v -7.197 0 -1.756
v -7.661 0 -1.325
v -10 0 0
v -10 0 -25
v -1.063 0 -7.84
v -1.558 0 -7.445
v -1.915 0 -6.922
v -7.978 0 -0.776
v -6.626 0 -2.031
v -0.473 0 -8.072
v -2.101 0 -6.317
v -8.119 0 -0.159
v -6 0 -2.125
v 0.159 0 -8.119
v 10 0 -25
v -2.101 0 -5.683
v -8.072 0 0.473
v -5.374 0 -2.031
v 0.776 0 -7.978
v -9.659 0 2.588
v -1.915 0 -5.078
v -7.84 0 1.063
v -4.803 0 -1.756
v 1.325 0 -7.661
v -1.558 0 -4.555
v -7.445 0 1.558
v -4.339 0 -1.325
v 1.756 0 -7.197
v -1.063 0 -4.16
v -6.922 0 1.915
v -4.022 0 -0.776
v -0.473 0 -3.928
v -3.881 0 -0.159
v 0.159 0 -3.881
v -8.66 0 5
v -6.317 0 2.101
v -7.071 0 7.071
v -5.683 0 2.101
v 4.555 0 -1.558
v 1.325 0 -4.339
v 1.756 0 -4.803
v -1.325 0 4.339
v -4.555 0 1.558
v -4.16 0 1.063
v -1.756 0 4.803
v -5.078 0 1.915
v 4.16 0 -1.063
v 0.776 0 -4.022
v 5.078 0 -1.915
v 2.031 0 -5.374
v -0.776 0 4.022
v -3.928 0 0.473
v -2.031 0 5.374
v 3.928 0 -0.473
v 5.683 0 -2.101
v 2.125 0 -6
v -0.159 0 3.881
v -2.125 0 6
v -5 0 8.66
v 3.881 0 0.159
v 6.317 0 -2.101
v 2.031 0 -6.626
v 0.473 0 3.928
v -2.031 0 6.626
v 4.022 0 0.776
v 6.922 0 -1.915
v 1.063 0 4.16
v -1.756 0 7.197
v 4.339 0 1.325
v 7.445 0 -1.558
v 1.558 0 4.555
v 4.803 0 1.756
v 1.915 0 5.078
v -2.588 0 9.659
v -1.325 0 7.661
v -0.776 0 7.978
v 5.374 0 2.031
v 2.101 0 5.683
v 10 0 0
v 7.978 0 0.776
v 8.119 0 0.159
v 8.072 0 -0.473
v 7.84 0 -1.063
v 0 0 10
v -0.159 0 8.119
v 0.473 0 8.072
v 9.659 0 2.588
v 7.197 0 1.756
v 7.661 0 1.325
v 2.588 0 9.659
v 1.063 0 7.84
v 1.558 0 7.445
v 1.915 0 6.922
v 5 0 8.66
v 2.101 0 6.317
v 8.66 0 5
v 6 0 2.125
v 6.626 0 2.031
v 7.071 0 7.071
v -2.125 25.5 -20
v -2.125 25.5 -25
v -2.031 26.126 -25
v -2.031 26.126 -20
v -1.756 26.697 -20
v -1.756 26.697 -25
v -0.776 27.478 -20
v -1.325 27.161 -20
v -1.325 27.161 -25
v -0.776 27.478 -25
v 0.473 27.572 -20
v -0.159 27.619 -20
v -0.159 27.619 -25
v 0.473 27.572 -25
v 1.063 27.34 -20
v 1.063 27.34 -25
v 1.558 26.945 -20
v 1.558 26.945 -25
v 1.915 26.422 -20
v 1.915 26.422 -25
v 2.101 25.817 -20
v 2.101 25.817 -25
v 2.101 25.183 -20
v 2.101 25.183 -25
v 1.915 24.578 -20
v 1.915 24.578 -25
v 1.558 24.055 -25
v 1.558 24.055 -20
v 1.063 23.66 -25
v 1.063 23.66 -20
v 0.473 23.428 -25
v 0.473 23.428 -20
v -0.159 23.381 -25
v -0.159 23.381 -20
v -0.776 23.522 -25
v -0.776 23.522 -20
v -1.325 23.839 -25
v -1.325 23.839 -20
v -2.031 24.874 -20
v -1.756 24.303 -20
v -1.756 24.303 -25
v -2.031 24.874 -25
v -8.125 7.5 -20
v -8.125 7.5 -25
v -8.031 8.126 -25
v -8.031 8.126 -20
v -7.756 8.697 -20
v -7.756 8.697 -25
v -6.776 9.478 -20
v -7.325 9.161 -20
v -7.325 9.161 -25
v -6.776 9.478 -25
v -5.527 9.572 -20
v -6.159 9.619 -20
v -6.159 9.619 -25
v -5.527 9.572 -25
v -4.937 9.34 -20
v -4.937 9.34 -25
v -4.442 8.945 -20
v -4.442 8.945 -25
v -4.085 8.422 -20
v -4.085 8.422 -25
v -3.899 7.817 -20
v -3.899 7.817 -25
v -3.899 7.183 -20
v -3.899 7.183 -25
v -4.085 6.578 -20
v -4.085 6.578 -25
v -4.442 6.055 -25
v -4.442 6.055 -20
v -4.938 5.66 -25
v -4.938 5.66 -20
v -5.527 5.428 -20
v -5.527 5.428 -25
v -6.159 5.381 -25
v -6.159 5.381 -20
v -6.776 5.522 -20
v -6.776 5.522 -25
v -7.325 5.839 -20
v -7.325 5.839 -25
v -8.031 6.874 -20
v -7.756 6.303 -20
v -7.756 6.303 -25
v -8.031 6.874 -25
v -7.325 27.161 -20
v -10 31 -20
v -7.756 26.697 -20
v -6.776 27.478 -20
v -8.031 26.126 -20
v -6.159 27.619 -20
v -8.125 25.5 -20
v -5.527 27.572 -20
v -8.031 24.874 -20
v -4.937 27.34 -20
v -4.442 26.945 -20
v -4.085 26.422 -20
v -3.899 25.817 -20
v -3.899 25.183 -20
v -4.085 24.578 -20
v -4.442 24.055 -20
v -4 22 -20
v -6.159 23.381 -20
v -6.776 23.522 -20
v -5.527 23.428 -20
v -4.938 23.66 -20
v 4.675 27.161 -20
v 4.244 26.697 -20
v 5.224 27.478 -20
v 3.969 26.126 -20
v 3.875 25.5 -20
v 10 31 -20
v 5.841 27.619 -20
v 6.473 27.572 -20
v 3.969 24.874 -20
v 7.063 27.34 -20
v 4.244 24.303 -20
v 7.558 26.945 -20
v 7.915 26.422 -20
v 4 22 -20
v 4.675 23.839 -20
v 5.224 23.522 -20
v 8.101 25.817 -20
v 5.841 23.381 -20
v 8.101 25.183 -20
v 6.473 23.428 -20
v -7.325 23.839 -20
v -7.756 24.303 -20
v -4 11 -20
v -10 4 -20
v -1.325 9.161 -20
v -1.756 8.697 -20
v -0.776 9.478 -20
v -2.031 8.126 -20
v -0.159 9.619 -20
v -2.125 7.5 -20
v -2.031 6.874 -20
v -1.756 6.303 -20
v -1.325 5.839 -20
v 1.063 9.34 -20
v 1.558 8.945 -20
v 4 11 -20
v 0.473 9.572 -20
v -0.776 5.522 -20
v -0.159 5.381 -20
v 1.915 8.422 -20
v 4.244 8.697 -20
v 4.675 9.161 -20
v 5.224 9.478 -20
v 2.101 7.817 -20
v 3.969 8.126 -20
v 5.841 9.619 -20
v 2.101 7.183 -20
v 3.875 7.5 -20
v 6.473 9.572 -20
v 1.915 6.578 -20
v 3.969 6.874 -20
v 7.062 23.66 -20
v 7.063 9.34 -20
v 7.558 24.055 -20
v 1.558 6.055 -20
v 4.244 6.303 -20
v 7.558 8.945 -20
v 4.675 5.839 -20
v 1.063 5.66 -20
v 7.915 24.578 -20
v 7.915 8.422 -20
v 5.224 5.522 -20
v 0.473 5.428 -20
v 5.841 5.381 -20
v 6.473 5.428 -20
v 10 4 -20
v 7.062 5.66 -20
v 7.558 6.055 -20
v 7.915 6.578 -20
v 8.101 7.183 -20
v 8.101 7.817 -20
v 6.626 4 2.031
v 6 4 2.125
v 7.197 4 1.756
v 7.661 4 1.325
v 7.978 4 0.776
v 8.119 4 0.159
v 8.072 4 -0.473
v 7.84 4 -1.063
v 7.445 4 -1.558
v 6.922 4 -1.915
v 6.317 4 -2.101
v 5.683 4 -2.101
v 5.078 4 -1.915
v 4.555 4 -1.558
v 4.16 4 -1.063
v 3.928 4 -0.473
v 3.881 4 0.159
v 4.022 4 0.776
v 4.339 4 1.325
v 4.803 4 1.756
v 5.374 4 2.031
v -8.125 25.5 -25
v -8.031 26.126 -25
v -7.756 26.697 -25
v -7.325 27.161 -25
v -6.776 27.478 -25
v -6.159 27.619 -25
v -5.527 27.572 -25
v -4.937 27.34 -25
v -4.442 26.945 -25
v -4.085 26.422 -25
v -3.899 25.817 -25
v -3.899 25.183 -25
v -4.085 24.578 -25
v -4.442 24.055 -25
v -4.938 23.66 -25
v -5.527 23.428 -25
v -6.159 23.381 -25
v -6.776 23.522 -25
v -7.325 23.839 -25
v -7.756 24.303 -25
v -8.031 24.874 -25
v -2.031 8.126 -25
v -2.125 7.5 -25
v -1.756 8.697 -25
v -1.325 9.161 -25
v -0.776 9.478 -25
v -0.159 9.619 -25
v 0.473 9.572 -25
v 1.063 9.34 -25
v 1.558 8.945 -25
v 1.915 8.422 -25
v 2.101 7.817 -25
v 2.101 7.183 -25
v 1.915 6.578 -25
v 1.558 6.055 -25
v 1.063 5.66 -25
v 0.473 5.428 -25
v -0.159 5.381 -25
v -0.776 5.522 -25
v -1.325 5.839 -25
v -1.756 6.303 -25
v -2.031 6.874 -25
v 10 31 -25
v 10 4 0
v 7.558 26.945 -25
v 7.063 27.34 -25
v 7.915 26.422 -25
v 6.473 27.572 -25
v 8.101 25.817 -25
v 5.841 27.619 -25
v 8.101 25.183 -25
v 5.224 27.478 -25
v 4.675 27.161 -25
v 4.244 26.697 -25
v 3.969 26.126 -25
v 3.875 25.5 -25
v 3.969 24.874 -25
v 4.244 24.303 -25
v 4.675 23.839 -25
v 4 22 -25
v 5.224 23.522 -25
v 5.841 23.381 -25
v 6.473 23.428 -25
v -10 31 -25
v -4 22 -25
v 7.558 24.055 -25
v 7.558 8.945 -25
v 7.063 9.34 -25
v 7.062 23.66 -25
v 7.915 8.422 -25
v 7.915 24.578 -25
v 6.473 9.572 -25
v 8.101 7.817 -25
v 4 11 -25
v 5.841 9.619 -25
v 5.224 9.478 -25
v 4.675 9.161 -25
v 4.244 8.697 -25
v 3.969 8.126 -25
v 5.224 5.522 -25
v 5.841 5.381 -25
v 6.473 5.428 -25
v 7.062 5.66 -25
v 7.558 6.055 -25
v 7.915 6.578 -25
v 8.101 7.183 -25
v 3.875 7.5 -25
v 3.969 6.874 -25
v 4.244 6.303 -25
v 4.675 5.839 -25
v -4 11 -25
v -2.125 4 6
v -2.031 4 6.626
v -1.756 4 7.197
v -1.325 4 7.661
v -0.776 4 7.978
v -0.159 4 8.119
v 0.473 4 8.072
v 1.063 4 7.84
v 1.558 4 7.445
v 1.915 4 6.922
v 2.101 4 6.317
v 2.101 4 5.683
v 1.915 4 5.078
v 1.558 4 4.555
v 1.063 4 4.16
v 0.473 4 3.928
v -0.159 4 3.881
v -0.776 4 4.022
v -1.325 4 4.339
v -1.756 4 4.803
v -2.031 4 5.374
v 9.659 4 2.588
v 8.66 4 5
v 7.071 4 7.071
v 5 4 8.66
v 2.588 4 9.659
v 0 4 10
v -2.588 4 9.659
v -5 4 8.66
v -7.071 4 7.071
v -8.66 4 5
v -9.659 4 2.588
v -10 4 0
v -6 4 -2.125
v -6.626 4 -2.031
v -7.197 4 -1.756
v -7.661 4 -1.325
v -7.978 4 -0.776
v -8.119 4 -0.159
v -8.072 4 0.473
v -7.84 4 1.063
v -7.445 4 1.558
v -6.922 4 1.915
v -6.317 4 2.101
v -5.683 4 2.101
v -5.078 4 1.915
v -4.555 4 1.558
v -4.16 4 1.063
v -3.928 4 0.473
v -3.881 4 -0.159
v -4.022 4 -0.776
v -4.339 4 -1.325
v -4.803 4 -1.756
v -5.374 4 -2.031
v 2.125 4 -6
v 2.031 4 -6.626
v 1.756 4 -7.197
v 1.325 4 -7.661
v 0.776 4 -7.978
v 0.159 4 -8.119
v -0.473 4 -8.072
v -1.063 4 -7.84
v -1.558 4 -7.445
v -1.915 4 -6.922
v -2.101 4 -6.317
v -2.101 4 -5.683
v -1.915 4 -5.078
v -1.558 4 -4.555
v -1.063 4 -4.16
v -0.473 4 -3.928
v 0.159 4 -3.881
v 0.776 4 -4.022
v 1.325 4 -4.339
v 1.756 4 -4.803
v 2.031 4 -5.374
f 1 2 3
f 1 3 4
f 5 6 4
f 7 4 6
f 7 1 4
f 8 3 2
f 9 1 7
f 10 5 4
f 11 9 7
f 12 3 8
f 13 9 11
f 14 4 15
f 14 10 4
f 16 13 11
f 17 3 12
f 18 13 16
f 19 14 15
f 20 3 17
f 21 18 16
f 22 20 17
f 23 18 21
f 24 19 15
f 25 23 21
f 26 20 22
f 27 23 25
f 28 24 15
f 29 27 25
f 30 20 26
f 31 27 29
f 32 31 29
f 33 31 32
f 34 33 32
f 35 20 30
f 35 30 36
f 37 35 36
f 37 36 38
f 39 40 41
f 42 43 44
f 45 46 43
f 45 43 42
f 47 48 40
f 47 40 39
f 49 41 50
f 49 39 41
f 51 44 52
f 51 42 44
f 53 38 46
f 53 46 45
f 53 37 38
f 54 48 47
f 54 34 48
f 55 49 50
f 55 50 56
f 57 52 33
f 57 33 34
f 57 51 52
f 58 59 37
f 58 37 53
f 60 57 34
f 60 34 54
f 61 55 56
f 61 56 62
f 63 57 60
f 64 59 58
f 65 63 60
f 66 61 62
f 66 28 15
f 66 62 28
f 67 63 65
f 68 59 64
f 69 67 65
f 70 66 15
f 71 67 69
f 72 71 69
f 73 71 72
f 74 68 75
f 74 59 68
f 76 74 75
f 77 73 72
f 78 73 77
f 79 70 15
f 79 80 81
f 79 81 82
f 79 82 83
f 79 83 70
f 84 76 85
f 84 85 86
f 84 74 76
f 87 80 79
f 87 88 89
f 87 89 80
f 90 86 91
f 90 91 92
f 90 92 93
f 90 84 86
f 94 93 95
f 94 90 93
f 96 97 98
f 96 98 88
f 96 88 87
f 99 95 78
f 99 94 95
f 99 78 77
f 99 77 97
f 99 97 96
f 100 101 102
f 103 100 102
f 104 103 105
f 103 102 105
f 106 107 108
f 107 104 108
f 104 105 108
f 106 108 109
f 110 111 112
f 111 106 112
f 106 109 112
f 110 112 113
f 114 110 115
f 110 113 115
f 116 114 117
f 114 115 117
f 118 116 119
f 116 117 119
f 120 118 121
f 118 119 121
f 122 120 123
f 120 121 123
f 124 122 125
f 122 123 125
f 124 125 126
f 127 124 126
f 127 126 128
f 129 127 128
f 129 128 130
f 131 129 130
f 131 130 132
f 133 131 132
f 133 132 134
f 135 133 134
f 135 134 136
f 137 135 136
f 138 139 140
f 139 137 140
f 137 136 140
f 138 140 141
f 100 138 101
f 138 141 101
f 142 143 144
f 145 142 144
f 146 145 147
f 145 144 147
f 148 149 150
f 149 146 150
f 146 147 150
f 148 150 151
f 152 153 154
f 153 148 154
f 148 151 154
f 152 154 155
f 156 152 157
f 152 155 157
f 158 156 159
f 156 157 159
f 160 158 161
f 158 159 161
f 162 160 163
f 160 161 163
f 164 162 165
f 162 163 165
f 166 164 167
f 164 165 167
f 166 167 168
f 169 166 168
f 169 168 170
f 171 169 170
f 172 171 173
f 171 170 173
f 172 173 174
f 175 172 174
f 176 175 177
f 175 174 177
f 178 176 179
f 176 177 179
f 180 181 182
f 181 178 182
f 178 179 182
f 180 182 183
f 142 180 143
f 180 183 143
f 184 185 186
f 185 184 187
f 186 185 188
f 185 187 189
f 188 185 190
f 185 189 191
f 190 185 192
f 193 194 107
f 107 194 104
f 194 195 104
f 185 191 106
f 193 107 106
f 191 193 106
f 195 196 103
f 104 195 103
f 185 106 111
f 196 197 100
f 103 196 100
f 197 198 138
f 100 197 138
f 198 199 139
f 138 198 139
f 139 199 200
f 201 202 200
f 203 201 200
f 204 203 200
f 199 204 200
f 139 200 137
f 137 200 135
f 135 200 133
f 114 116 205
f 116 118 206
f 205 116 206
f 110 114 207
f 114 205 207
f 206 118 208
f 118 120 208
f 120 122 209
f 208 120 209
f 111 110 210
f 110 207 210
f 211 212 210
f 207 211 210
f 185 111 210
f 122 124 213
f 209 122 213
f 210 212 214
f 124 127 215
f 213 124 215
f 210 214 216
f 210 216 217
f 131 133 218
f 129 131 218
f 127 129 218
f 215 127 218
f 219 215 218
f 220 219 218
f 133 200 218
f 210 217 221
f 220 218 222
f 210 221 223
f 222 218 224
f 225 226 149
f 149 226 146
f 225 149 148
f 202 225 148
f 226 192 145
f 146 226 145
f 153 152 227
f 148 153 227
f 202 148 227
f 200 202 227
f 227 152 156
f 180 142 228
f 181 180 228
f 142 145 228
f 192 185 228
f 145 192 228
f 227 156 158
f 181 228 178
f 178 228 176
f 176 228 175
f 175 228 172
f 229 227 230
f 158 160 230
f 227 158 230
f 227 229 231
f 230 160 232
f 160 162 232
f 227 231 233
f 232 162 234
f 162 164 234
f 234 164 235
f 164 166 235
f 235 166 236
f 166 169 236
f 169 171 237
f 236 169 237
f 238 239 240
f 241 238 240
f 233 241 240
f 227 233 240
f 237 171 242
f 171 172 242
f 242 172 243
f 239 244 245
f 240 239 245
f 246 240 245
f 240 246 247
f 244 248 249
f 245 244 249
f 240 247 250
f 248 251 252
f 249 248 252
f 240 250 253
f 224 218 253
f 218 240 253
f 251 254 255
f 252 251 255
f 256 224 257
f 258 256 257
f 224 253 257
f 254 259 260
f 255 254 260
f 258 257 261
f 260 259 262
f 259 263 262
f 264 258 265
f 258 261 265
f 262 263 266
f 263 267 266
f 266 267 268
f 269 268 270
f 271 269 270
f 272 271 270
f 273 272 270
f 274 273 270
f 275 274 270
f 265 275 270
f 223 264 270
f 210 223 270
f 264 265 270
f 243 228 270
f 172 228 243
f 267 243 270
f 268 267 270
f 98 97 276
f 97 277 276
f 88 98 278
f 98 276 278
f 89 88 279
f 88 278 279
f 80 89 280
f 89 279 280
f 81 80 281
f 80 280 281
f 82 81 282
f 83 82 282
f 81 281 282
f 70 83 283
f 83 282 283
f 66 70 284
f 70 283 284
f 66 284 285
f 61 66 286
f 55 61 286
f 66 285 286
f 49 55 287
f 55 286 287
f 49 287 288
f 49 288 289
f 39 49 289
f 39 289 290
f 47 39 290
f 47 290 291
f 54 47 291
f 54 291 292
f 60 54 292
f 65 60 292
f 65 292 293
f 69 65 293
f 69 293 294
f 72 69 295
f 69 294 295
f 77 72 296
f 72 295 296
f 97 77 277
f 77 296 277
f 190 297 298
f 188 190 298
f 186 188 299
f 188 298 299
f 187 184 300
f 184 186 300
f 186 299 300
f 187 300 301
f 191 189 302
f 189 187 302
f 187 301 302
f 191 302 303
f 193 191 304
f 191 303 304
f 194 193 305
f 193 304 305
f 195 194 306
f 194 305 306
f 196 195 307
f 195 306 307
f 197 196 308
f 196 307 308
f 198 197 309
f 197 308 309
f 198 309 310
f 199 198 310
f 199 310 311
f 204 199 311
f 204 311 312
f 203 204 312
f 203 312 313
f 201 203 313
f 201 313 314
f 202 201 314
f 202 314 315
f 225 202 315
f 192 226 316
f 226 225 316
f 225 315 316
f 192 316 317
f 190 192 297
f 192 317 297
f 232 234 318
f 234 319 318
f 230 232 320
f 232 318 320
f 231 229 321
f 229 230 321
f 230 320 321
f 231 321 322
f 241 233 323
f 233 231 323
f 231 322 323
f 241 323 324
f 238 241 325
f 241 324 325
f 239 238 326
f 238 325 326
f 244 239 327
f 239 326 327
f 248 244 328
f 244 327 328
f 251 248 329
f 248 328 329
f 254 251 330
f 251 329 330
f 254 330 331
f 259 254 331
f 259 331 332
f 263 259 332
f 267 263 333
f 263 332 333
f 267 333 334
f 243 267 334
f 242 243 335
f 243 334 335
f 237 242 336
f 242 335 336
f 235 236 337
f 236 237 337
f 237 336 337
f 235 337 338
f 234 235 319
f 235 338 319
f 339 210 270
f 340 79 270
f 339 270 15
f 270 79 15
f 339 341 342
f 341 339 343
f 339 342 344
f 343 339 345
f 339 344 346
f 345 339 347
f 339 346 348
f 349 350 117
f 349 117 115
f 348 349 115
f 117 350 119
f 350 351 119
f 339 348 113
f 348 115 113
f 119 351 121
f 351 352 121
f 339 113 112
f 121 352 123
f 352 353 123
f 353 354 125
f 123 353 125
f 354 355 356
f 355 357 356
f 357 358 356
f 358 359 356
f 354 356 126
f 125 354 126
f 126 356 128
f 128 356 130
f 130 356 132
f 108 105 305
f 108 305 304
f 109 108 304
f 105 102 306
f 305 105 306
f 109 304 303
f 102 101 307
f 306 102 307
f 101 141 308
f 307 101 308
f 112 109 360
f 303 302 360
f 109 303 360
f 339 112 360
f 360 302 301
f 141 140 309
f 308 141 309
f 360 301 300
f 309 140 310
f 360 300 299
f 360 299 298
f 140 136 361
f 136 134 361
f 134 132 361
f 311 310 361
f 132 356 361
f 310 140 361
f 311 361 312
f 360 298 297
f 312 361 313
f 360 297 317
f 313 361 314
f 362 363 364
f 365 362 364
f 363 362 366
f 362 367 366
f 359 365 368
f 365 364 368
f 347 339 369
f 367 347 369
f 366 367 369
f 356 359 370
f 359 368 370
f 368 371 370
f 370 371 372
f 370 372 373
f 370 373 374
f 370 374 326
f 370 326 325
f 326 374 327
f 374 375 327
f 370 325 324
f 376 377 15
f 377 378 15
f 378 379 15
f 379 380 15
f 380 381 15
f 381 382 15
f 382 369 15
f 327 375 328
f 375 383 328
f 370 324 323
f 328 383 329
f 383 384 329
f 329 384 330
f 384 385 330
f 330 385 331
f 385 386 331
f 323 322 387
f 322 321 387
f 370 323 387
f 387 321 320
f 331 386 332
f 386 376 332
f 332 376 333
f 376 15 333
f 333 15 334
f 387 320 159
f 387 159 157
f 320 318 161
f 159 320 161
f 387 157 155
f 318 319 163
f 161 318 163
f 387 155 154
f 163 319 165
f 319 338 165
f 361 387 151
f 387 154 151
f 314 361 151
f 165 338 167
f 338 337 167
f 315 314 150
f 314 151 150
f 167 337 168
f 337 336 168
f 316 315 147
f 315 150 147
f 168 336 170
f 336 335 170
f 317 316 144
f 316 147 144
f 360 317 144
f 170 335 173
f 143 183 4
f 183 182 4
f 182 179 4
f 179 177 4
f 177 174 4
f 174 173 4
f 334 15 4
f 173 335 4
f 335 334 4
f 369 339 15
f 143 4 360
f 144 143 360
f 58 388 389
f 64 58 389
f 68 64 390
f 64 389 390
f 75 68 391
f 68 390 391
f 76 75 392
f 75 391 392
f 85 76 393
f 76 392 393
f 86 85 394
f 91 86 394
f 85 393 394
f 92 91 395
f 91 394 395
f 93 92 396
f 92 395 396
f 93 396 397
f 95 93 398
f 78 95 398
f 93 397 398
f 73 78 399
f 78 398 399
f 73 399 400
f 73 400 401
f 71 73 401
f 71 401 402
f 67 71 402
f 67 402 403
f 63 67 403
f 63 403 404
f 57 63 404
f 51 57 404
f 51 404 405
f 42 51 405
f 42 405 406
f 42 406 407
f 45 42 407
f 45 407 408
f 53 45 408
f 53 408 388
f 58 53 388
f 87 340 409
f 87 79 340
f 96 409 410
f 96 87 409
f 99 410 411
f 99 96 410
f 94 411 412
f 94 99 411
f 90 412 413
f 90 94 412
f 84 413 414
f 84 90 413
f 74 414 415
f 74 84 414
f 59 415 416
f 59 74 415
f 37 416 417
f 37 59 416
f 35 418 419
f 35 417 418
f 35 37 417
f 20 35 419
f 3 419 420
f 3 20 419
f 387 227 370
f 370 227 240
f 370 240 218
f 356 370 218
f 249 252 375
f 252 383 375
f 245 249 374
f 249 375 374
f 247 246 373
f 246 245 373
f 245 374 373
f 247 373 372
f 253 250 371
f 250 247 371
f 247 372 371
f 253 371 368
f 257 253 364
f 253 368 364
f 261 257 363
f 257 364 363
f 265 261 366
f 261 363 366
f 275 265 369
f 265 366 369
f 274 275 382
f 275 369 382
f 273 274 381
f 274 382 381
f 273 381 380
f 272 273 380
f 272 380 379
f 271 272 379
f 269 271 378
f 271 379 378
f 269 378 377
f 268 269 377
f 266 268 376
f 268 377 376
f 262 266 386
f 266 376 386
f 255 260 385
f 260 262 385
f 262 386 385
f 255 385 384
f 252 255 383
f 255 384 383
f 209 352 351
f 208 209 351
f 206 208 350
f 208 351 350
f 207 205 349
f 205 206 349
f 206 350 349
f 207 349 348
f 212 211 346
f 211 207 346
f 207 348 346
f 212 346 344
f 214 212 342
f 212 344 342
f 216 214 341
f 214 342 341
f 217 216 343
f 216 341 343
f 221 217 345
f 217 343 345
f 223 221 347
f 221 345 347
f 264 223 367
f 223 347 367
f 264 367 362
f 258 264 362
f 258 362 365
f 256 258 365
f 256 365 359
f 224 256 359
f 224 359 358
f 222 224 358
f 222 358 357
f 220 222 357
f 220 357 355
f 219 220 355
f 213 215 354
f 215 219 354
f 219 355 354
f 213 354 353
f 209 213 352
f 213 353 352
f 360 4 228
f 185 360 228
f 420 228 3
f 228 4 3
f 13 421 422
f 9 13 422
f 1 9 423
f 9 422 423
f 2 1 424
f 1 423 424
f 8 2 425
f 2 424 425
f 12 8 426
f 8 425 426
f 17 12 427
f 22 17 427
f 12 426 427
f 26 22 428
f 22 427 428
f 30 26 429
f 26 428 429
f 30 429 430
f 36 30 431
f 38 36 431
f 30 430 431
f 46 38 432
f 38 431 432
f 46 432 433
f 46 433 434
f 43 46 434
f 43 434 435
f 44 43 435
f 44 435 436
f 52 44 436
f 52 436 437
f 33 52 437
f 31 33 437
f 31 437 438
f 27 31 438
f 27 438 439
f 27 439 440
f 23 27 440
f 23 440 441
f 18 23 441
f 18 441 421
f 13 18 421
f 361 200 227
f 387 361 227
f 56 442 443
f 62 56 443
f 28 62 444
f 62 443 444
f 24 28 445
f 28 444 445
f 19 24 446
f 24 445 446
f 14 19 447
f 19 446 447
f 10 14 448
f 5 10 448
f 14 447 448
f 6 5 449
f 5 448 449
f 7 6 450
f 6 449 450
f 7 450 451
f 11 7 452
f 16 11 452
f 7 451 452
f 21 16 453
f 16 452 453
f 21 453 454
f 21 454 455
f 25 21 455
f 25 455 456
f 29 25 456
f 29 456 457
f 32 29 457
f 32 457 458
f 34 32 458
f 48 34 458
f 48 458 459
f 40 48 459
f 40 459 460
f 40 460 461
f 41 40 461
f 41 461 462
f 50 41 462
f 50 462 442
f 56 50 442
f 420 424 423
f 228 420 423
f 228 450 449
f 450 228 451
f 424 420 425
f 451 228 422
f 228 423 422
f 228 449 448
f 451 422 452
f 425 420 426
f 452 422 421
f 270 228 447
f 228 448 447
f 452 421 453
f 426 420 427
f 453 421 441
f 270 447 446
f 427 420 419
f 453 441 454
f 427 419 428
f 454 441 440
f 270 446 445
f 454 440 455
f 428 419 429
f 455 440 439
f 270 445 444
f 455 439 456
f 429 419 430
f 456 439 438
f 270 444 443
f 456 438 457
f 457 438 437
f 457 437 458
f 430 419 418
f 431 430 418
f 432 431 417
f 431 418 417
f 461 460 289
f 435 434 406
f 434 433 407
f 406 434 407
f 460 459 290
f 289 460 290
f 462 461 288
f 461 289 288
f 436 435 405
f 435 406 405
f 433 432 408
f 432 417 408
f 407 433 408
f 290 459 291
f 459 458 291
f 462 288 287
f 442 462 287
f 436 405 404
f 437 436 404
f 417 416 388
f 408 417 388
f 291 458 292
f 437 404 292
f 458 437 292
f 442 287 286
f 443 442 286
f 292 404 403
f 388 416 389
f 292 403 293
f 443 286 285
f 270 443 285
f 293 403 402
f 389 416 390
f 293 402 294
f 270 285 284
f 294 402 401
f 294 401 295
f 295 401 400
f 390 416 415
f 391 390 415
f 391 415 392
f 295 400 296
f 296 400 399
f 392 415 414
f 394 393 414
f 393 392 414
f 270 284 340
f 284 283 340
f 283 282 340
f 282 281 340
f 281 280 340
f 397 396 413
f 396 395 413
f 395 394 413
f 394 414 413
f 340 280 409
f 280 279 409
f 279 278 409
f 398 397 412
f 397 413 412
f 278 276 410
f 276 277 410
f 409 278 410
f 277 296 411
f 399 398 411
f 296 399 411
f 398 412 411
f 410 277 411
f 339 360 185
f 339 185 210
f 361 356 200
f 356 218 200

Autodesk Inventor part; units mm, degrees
ref_plane "YZ Plane" through (0, 0, 0) normal (1, 0, 0) x (0, 1, 0)
ref_plane "XZ Plane" through (0, 0, 0) normal (0, 1, 0) x (-1, 0, 0)
ref_plane "XY Plane" through (0, 0, 0) normal (0, 0, 1) x (1, 0, 0)
sketch "Sketch1" plane through (0, 0, 0) normal (0, 1, 0) x (-1, 0, 0)
  circle A0 centre (0, 0) radius 10
  dimension "d0" = 20
extrude "Extrusion1" add sketch "Sketch1" along normal blind 4
sketch "Sketch2" plane through (0, 4, 0) normal (0, 1, 0) x (1, 0, 0)
  line L0 (0, 0) -> (0, 6)
  circle A0 centre (0, 6) radius 2.125
  dimension "d3" = 6
  dimension "d4" = 4.25
extrude "Extrusion2" cut sketch "Sketch2" against normal through all
pattern_circular "Circular Pattern1" count 4 over 360 about axis through (0, 0, 0) along (0, 1, 0) of "Extrusion2"
sketch "Sketch3" plane through (0, 0, 0) normal (0, -1, 0) x (1, 0, 0)
  circle A0 centre (0, 0) radius 10 projected
  arc A1 (-10, 0) -> (10, 0) centre (0, 0) ccw
  line L0 (10, 0) -> (10, -25)
  line L1 (10, -25) -> (-10, -25)
  line L2 (-10, -25) -> (-10, 0)
  dimension "d10" = 25
extrude "Extrusion3" add sketch "Sketch3" against normal blind 4 contours L0 L1 L2 A0
sketch "Sketch4" plane through (0, 4, 0) normal (0, 1, 0) x (1, 0, 0)
  line L0 (-10, 25) -> (-10, 0) projected
  line L1 (10, 25) -> (-10, 25)
  line L2 (-10, 25) -> (-10, 20)
  line L3 (-10, 20) -> (10, 20)
  line L4 (10, 20) -> (10, 25)
  point P0 (0, 0)
  dimension "d13" = 5
extrude "Extrusion4" add sketch "Sketch4" along normal blind 27
sketch "Sketch5" plane through (10, 0, -25) normal (0, 0, -1) x (-1, 0, 0)
  point P0 (10, 0)
sketch "Sketch6" plane through (10, 0, -25) normal (0, 0, -1) x (-1, 0, 0)
  line L0 (7.875, 4) -> (12.125, 4) projected
  line L1 (20, 31) -> (0, 31) projected
  line L2 (10, 17.5) -> (20, 17.5)
  line L3 (10, 17.5) -> (10, 23.5)
  line L4 (10, 23.5) -> (10, 25.5)
  circle A0 centre (10, 25.5) radius 2.125
  point P0 (10, 0)
  dimension "d16" = 6
  dimension "d26" = 2
  dimension "d27" = 4.25
extrude "Extrusion5" cut sketch "Sketch6" against normal through all
pattern_linear "Rectangular Pattern1" count 3 spacing 6 along (-1, 0, 0) count 2 spacing 18 along (0, -1, 0) of "Extrusion5" first direction both ways yes
sketch "Sketch7" plane through (-10, 4, -20) normal (0, 0, 1) x (1, 0, 0)
  circle A0 centre (10, 21.5) radius 2.125 projected
  circle A1 centre (10, 3.5) radius 2.125 projected
  line L0 (10, 21.5) -> (10, 3.5)
  line L1 (6, 7) -> (14, 7)
  line L2 (14, 7) -> (14, 18)
  line L3 (14, 18) -> (6, 18)
  line L4 (6, 18) -> (6, 7)
  line L5 (6, 7) -> (14, 18) construction
  line L6 (14, 7) -> (6, 18) construction
  point P0 (10, -4)
  point P1 (10, 12.5)
  dimension "d29" = 8
  dimension "d30" = 11
extrude "Extrusion6" cut sketch "Sketch7" against normal through all contours L3 L2 L1 L0 | L0 L1 L4 L3
properties part number "ClawJoint"
